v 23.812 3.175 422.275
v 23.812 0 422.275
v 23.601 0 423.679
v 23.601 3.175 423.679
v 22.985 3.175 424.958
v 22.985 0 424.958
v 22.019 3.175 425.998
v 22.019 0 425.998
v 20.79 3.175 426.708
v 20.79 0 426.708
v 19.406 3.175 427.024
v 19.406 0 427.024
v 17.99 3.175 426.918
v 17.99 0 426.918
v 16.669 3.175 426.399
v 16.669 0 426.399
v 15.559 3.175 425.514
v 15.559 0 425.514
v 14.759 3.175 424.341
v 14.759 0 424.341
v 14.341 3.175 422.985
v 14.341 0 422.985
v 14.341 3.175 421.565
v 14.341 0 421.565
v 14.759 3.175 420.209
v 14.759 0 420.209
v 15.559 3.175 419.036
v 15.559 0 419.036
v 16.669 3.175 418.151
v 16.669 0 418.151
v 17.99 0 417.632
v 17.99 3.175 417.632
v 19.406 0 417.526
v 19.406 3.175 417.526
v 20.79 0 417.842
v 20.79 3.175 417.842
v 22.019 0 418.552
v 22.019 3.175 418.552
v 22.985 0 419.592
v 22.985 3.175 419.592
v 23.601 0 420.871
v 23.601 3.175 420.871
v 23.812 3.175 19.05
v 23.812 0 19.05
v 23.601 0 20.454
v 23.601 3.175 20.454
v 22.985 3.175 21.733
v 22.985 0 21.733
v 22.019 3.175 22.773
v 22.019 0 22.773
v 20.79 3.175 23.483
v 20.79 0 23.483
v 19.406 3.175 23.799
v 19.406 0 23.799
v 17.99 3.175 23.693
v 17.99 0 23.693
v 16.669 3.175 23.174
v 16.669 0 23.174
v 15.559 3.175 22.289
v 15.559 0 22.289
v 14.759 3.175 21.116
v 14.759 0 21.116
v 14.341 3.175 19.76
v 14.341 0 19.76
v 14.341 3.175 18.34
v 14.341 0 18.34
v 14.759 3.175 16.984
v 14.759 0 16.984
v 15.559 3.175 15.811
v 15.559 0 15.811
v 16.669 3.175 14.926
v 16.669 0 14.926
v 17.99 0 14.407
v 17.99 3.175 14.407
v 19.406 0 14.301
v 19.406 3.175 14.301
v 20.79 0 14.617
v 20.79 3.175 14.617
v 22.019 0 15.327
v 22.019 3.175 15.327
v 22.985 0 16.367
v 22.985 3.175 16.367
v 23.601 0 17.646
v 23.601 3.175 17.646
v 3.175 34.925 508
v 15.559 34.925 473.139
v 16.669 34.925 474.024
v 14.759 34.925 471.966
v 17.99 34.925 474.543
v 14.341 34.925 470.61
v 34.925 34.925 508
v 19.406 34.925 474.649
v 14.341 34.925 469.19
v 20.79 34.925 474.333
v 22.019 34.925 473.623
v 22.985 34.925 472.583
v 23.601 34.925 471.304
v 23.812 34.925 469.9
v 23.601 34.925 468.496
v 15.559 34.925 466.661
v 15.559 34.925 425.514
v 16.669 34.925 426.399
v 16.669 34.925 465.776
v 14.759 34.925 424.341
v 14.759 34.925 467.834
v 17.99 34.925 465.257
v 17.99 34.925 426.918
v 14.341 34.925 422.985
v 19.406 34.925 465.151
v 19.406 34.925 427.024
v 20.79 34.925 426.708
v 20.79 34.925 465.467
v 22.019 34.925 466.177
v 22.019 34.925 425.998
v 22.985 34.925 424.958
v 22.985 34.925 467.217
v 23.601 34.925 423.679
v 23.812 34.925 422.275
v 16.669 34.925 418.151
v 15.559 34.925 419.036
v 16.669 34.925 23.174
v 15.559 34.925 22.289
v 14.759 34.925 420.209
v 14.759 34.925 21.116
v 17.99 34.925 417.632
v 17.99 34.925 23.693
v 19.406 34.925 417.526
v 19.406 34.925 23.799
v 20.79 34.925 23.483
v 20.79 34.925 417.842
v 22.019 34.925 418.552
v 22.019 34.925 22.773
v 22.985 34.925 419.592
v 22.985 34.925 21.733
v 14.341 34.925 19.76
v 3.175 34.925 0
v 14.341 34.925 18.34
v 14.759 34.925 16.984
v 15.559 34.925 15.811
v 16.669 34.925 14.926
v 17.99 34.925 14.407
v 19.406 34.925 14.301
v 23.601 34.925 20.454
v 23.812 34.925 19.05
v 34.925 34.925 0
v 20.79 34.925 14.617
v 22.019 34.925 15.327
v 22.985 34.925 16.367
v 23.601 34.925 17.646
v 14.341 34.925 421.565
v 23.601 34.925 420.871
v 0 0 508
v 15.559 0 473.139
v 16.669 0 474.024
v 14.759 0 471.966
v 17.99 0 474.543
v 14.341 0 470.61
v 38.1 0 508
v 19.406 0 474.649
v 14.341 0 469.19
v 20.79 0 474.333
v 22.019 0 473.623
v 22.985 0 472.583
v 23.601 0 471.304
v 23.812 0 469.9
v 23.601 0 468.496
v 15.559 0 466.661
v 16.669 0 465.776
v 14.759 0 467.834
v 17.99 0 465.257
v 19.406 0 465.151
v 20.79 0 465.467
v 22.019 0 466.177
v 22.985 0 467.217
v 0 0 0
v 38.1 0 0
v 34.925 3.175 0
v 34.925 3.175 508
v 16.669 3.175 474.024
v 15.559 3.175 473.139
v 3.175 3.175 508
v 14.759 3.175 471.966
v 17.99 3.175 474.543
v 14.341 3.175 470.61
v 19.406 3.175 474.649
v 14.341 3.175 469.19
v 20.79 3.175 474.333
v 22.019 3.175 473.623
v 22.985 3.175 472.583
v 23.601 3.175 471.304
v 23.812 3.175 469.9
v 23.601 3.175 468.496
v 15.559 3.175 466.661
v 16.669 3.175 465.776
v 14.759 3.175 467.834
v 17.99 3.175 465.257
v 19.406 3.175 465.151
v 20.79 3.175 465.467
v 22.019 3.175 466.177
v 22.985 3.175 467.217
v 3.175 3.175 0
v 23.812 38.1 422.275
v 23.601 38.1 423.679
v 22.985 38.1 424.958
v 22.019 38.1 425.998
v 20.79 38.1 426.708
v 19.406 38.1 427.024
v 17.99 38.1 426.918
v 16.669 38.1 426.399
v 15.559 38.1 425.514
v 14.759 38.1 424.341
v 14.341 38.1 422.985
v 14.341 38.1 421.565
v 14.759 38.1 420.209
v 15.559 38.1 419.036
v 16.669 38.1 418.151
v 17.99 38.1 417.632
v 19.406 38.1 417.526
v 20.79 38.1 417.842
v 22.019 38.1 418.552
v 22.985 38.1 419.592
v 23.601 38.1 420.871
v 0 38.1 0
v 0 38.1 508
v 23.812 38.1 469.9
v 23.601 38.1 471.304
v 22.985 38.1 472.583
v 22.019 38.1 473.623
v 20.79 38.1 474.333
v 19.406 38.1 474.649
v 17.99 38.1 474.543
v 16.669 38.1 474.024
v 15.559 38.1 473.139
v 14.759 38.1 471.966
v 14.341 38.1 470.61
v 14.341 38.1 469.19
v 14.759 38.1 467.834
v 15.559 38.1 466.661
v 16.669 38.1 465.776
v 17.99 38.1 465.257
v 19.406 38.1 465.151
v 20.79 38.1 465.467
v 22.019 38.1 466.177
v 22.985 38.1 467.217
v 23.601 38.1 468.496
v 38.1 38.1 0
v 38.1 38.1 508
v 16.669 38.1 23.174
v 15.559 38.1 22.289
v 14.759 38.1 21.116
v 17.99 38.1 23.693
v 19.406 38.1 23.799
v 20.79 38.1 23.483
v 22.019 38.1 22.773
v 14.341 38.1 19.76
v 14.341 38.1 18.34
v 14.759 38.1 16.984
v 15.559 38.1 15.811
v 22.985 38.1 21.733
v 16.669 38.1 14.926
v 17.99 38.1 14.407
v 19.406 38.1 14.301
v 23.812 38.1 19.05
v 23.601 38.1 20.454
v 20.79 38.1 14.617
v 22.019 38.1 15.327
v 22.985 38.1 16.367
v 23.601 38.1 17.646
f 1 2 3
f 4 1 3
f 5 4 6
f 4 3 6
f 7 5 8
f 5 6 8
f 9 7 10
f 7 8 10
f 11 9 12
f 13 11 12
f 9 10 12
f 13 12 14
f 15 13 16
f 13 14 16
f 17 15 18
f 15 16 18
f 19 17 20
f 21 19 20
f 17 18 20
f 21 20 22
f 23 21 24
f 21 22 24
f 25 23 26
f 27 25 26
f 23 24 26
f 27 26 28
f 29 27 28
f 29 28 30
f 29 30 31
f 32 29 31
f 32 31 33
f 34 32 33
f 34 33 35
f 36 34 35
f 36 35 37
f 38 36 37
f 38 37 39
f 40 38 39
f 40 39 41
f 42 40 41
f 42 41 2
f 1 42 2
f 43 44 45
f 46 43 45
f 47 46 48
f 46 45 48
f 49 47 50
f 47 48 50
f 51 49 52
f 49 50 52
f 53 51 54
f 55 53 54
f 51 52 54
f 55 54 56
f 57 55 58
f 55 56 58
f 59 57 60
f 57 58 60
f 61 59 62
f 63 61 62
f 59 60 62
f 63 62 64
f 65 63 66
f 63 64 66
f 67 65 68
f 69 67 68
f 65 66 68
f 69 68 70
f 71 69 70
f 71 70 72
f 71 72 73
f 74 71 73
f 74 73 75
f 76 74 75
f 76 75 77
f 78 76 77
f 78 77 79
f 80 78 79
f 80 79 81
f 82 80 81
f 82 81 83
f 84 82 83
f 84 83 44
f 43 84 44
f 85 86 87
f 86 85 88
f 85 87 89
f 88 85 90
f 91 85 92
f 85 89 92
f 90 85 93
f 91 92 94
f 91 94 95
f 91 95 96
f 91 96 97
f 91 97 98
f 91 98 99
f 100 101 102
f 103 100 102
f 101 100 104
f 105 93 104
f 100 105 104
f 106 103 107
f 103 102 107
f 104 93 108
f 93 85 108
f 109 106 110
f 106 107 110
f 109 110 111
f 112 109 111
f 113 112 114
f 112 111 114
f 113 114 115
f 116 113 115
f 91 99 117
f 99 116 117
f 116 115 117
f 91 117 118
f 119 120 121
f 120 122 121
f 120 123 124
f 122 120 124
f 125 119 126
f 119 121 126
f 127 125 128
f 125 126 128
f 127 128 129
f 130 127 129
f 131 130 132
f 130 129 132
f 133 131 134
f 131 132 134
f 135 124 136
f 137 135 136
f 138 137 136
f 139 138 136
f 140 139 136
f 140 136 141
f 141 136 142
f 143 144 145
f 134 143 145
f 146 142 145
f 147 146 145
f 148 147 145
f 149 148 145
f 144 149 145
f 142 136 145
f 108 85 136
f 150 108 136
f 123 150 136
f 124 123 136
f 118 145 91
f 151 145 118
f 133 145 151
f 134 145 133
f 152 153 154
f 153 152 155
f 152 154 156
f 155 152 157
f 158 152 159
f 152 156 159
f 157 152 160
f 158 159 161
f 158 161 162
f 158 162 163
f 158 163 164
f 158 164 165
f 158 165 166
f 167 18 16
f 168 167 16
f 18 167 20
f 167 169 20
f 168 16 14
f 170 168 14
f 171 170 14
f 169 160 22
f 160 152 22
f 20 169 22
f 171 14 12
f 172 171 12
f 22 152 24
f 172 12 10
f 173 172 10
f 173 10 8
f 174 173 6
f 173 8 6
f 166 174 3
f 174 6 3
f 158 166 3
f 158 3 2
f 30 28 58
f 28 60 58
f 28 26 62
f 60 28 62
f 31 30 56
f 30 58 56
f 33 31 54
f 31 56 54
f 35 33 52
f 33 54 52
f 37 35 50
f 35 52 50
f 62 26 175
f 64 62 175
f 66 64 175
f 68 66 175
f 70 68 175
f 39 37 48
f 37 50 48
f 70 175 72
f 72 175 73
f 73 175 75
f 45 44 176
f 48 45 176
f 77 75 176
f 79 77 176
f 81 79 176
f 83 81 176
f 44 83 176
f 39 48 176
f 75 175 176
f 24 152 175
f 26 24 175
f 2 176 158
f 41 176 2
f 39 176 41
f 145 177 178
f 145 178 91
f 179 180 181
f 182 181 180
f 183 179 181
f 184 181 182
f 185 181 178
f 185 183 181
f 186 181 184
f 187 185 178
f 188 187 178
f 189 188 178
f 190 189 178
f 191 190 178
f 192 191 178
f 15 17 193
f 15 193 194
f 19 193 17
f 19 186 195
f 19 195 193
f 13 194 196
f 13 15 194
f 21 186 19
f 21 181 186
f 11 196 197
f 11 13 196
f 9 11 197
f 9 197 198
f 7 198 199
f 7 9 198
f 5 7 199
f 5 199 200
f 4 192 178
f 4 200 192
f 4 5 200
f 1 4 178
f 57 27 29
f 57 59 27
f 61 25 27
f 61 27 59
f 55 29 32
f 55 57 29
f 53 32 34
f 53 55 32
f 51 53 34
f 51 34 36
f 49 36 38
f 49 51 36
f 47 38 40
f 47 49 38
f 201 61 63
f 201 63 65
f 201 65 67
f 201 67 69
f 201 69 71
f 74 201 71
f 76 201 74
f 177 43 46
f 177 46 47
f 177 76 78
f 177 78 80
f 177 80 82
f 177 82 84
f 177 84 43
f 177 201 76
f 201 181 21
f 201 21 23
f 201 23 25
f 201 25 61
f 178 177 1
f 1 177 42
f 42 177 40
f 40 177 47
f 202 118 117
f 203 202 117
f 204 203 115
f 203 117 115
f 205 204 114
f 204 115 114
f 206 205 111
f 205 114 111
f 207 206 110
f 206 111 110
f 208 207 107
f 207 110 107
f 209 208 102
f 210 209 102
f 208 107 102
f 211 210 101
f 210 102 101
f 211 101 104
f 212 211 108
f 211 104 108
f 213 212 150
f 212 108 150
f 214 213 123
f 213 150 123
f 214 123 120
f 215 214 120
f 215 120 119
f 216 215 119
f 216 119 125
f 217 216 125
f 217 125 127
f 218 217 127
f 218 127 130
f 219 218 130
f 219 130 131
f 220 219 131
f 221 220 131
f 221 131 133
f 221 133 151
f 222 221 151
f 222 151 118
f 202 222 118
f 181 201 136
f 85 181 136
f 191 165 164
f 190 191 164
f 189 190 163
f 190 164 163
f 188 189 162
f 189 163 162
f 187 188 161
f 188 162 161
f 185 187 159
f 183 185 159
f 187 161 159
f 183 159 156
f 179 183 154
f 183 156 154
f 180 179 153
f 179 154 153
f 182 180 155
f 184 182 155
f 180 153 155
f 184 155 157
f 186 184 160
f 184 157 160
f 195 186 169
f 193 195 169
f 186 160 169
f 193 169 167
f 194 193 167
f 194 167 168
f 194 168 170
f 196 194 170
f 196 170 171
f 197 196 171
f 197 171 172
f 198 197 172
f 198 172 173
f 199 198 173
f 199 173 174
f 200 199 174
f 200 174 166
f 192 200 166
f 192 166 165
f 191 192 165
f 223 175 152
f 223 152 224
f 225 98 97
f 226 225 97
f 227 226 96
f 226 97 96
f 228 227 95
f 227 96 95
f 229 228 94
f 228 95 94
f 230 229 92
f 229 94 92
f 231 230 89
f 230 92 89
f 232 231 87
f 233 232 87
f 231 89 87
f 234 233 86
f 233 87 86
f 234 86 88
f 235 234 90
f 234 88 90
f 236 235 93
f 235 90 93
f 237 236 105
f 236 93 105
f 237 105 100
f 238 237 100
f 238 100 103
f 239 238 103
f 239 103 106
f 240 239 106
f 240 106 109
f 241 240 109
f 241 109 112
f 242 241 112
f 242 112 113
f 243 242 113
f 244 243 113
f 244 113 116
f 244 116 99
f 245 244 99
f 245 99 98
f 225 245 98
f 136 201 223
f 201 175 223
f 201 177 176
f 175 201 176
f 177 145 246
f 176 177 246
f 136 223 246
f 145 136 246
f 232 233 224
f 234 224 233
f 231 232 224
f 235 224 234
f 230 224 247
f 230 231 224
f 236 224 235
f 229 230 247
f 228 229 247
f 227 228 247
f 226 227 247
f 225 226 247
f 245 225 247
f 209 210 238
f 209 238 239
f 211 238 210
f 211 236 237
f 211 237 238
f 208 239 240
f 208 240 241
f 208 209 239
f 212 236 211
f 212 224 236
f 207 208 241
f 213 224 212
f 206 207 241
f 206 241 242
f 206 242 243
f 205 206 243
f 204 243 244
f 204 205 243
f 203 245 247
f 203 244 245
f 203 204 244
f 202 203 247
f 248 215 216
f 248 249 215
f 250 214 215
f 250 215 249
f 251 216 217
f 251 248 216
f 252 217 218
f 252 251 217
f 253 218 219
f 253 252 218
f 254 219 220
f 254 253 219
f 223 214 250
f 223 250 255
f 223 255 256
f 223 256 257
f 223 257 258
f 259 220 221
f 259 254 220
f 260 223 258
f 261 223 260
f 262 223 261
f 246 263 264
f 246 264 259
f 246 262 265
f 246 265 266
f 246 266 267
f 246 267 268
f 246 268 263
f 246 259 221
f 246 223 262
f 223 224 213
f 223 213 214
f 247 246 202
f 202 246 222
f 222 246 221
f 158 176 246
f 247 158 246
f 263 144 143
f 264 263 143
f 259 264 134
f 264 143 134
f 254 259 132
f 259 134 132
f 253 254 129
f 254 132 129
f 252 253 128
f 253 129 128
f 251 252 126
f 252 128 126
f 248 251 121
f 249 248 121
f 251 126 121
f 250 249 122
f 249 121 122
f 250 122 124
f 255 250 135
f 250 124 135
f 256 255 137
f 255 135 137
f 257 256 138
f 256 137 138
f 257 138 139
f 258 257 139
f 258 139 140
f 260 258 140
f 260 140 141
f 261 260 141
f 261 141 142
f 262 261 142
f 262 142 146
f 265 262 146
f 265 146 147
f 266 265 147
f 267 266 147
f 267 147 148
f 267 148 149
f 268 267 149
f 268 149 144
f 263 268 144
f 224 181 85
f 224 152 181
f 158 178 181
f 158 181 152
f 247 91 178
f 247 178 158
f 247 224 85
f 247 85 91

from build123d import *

# Parameters (mm, degrees)
F0_W     = 38.1
F0_H     = 38.1
F0_W_2   = 31.75
F0_H_2   = 31.75
F1_DEPTH = 508
F2_R     = 4.7625
F3_DEPTH = 38.101
F4_R     = 4.7625
F5_DEPTH = 38.101
F6_R     = 4.7625
F7_DEPTH = 38.101


with BuildPart() as f1:
    # F0 (on Top) → F1 (new body)
    with BuildSketch(Plane.XY):
        with Locations((19.05, 19.05)):
            Rectangle(F0_W, F0_H)
        with Locations((19.05, 19.05)):
            Rectangle(F0_W_2, F0_H_2, mode=Mode.SUBTRACT)
    extrude(amount=F1_DEPTH)

    # F2 (on face) → F3 (cut, through all)
    with BuildSketch(Plane.XZ):
        with Locations((19.05, 19.05)):
            Circle(F2_R)
    extrude(amount=-F3_DEPTH, mode=Mode.SUBTRACT)

    # F4 (on face) → F5 (cut, through all)
    with BuildSketch(Plane.XZ):
        with Locations((19.05, 422.275)):
            Circle(F4_R)
    extrude(amount=-F5_DEPTH, mode=Mode.SUBTRACT)

    # F6 (on face) → F7 (cut, through all)
    with BuildSketch(Plane.XZ):
        with Locations((19.05, 469.9)):
            Circle(F6_R)
    extrude(amount=-F7_DEPTH, mode=Mode.SUBTRACT)


solid = f1.part
